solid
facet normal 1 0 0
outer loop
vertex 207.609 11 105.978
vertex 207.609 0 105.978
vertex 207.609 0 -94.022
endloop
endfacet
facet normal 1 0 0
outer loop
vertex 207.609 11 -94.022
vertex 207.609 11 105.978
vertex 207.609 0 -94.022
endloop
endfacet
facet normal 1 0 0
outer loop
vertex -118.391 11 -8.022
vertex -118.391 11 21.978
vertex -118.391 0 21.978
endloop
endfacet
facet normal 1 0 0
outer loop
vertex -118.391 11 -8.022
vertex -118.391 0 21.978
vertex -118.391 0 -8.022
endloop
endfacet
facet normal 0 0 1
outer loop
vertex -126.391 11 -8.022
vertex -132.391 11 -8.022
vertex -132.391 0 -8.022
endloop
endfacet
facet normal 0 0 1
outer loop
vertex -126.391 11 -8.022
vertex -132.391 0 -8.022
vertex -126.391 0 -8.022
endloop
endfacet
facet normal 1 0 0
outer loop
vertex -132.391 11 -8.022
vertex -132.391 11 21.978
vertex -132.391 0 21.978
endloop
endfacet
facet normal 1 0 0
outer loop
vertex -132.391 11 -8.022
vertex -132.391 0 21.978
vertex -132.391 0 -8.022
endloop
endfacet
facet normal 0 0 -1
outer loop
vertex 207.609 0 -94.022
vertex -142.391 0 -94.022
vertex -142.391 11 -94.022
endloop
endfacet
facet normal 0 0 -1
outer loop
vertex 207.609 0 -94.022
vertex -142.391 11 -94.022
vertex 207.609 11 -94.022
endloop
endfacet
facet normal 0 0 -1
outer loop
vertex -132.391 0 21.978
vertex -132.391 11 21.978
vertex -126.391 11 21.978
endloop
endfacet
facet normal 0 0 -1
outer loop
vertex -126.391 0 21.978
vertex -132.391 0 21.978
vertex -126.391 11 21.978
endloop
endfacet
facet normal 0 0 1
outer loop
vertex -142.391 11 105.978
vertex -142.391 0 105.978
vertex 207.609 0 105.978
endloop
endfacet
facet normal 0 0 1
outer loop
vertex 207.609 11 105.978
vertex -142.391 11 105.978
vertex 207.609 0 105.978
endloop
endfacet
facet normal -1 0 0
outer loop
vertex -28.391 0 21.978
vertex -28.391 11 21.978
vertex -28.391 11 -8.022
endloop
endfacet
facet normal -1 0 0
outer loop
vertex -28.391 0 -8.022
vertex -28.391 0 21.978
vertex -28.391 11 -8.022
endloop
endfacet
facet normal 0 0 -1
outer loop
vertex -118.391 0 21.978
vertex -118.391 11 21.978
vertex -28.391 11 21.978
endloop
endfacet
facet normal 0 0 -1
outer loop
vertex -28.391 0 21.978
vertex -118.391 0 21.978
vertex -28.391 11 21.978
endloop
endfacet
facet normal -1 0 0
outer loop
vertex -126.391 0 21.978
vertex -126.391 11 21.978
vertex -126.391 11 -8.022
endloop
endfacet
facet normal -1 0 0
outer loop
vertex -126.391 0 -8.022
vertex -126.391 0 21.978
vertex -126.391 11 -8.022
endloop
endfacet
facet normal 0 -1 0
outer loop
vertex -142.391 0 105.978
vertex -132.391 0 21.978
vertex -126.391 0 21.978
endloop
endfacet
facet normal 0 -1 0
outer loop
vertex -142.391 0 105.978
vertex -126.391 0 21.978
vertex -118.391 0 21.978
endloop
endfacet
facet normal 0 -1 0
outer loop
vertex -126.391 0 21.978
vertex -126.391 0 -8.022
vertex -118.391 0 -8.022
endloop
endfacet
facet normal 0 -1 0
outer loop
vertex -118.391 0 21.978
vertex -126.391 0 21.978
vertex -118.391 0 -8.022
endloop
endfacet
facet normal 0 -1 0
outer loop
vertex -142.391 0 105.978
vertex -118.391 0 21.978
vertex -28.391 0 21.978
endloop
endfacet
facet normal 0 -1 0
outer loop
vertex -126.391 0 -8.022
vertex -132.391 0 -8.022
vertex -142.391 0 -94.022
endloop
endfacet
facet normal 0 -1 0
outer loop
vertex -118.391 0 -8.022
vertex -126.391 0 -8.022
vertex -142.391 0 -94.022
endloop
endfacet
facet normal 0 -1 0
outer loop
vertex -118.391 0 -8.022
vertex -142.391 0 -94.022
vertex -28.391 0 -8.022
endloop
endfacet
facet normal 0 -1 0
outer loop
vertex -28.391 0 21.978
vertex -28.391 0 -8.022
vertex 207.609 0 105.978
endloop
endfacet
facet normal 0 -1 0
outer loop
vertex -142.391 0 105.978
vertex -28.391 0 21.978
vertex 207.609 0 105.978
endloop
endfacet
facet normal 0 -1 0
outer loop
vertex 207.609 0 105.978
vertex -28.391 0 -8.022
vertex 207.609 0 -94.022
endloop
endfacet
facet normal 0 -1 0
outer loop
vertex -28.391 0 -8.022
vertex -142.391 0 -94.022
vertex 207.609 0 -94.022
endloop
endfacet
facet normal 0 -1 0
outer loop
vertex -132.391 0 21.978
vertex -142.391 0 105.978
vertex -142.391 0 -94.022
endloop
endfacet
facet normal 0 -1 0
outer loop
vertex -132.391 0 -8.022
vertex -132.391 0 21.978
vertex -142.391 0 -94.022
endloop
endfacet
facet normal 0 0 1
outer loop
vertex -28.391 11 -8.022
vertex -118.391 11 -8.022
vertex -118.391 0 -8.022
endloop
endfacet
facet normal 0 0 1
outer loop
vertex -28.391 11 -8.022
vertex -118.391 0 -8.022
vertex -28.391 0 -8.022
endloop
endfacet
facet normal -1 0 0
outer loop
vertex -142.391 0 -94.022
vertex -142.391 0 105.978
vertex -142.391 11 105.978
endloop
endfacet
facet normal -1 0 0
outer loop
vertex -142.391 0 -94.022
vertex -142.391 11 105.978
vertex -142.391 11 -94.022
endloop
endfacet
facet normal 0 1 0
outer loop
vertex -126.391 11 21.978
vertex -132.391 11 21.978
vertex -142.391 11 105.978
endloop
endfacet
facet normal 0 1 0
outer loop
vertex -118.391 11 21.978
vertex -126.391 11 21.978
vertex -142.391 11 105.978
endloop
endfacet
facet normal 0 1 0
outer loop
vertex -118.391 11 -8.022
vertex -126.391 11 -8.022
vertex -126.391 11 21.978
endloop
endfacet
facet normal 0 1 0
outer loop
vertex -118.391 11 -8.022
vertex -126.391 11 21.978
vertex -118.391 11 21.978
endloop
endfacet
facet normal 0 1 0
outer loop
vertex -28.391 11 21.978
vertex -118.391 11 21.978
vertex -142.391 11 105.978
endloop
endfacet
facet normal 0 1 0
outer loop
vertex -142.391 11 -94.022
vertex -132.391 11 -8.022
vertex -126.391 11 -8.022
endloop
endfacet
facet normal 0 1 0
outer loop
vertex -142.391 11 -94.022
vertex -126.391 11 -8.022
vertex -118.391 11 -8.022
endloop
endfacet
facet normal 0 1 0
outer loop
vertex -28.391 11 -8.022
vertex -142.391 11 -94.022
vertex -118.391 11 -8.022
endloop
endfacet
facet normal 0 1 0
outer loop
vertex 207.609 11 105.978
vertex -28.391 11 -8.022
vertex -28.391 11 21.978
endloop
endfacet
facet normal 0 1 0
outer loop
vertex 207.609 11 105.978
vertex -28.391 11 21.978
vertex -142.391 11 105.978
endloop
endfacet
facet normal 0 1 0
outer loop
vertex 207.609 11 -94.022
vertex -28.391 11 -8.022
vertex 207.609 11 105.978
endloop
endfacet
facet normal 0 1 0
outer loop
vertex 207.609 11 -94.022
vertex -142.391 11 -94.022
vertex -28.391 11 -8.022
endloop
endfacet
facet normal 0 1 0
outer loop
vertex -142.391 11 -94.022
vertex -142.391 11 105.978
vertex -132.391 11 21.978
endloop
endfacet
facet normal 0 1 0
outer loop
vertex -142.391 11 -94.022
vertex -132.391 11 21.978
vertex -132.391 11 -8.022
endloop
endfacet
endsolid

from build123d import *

# Parameters (mm, degrees)
SKETCH1_W               = 350
SKETCH1_H               = 200
BOSS_EXTRUDE1_DEPTH     = 11
SKETCH2_W               = 90
SKETCH2_H               = 30
SKETCH2_W_2             = 6
CUT_EXTRUDE1_DEPTH      = 1
CUT_EXTRUDE1_DEPTH_BACK = 12


with BuildPart() as part:
    # Sketch1 → Boss-Extrude1 (new body)
    with BuildSketch(Plane(origin=(0, 0, 0), x_dir=(1, 0, 0), z_dir=(0, 1, 0))):
        with Locations((32.608695652, -5.97826087)):
            Rectangle(SKETCH1_W, SKETCH1_H)
    extrude(amount=BOSS_EXTRUDE1_DEPTH)

    # Sketch2 → Cut-Extrude1 (cut, two sides)
    with BuildSketch(Plane(origin=(0, 11, 0), x_dir=(1, 0, 0), z_dir=(0, 1, 0))) as cut_extrude1_sk:
        with Locations((-73.391304348, -6.97826087)):
            Rectangle(SKETCH2_W, SKETCH2_H)
        with Locations((-129.391304348, -6.97826087)):
            Rectangle(SKETCH2_W_2, SKETCH2_H)
    extrude(amount=CUT_EXTRUDE1_DEPTH, mode=Mode.SUBTRACT)
    extrude(cut_extrude1_sk.sketch, amount=-CUT_EXTRUDE1_DEPTH_BACK, mode=Mode.SUBTRACT)


solid = part.part
